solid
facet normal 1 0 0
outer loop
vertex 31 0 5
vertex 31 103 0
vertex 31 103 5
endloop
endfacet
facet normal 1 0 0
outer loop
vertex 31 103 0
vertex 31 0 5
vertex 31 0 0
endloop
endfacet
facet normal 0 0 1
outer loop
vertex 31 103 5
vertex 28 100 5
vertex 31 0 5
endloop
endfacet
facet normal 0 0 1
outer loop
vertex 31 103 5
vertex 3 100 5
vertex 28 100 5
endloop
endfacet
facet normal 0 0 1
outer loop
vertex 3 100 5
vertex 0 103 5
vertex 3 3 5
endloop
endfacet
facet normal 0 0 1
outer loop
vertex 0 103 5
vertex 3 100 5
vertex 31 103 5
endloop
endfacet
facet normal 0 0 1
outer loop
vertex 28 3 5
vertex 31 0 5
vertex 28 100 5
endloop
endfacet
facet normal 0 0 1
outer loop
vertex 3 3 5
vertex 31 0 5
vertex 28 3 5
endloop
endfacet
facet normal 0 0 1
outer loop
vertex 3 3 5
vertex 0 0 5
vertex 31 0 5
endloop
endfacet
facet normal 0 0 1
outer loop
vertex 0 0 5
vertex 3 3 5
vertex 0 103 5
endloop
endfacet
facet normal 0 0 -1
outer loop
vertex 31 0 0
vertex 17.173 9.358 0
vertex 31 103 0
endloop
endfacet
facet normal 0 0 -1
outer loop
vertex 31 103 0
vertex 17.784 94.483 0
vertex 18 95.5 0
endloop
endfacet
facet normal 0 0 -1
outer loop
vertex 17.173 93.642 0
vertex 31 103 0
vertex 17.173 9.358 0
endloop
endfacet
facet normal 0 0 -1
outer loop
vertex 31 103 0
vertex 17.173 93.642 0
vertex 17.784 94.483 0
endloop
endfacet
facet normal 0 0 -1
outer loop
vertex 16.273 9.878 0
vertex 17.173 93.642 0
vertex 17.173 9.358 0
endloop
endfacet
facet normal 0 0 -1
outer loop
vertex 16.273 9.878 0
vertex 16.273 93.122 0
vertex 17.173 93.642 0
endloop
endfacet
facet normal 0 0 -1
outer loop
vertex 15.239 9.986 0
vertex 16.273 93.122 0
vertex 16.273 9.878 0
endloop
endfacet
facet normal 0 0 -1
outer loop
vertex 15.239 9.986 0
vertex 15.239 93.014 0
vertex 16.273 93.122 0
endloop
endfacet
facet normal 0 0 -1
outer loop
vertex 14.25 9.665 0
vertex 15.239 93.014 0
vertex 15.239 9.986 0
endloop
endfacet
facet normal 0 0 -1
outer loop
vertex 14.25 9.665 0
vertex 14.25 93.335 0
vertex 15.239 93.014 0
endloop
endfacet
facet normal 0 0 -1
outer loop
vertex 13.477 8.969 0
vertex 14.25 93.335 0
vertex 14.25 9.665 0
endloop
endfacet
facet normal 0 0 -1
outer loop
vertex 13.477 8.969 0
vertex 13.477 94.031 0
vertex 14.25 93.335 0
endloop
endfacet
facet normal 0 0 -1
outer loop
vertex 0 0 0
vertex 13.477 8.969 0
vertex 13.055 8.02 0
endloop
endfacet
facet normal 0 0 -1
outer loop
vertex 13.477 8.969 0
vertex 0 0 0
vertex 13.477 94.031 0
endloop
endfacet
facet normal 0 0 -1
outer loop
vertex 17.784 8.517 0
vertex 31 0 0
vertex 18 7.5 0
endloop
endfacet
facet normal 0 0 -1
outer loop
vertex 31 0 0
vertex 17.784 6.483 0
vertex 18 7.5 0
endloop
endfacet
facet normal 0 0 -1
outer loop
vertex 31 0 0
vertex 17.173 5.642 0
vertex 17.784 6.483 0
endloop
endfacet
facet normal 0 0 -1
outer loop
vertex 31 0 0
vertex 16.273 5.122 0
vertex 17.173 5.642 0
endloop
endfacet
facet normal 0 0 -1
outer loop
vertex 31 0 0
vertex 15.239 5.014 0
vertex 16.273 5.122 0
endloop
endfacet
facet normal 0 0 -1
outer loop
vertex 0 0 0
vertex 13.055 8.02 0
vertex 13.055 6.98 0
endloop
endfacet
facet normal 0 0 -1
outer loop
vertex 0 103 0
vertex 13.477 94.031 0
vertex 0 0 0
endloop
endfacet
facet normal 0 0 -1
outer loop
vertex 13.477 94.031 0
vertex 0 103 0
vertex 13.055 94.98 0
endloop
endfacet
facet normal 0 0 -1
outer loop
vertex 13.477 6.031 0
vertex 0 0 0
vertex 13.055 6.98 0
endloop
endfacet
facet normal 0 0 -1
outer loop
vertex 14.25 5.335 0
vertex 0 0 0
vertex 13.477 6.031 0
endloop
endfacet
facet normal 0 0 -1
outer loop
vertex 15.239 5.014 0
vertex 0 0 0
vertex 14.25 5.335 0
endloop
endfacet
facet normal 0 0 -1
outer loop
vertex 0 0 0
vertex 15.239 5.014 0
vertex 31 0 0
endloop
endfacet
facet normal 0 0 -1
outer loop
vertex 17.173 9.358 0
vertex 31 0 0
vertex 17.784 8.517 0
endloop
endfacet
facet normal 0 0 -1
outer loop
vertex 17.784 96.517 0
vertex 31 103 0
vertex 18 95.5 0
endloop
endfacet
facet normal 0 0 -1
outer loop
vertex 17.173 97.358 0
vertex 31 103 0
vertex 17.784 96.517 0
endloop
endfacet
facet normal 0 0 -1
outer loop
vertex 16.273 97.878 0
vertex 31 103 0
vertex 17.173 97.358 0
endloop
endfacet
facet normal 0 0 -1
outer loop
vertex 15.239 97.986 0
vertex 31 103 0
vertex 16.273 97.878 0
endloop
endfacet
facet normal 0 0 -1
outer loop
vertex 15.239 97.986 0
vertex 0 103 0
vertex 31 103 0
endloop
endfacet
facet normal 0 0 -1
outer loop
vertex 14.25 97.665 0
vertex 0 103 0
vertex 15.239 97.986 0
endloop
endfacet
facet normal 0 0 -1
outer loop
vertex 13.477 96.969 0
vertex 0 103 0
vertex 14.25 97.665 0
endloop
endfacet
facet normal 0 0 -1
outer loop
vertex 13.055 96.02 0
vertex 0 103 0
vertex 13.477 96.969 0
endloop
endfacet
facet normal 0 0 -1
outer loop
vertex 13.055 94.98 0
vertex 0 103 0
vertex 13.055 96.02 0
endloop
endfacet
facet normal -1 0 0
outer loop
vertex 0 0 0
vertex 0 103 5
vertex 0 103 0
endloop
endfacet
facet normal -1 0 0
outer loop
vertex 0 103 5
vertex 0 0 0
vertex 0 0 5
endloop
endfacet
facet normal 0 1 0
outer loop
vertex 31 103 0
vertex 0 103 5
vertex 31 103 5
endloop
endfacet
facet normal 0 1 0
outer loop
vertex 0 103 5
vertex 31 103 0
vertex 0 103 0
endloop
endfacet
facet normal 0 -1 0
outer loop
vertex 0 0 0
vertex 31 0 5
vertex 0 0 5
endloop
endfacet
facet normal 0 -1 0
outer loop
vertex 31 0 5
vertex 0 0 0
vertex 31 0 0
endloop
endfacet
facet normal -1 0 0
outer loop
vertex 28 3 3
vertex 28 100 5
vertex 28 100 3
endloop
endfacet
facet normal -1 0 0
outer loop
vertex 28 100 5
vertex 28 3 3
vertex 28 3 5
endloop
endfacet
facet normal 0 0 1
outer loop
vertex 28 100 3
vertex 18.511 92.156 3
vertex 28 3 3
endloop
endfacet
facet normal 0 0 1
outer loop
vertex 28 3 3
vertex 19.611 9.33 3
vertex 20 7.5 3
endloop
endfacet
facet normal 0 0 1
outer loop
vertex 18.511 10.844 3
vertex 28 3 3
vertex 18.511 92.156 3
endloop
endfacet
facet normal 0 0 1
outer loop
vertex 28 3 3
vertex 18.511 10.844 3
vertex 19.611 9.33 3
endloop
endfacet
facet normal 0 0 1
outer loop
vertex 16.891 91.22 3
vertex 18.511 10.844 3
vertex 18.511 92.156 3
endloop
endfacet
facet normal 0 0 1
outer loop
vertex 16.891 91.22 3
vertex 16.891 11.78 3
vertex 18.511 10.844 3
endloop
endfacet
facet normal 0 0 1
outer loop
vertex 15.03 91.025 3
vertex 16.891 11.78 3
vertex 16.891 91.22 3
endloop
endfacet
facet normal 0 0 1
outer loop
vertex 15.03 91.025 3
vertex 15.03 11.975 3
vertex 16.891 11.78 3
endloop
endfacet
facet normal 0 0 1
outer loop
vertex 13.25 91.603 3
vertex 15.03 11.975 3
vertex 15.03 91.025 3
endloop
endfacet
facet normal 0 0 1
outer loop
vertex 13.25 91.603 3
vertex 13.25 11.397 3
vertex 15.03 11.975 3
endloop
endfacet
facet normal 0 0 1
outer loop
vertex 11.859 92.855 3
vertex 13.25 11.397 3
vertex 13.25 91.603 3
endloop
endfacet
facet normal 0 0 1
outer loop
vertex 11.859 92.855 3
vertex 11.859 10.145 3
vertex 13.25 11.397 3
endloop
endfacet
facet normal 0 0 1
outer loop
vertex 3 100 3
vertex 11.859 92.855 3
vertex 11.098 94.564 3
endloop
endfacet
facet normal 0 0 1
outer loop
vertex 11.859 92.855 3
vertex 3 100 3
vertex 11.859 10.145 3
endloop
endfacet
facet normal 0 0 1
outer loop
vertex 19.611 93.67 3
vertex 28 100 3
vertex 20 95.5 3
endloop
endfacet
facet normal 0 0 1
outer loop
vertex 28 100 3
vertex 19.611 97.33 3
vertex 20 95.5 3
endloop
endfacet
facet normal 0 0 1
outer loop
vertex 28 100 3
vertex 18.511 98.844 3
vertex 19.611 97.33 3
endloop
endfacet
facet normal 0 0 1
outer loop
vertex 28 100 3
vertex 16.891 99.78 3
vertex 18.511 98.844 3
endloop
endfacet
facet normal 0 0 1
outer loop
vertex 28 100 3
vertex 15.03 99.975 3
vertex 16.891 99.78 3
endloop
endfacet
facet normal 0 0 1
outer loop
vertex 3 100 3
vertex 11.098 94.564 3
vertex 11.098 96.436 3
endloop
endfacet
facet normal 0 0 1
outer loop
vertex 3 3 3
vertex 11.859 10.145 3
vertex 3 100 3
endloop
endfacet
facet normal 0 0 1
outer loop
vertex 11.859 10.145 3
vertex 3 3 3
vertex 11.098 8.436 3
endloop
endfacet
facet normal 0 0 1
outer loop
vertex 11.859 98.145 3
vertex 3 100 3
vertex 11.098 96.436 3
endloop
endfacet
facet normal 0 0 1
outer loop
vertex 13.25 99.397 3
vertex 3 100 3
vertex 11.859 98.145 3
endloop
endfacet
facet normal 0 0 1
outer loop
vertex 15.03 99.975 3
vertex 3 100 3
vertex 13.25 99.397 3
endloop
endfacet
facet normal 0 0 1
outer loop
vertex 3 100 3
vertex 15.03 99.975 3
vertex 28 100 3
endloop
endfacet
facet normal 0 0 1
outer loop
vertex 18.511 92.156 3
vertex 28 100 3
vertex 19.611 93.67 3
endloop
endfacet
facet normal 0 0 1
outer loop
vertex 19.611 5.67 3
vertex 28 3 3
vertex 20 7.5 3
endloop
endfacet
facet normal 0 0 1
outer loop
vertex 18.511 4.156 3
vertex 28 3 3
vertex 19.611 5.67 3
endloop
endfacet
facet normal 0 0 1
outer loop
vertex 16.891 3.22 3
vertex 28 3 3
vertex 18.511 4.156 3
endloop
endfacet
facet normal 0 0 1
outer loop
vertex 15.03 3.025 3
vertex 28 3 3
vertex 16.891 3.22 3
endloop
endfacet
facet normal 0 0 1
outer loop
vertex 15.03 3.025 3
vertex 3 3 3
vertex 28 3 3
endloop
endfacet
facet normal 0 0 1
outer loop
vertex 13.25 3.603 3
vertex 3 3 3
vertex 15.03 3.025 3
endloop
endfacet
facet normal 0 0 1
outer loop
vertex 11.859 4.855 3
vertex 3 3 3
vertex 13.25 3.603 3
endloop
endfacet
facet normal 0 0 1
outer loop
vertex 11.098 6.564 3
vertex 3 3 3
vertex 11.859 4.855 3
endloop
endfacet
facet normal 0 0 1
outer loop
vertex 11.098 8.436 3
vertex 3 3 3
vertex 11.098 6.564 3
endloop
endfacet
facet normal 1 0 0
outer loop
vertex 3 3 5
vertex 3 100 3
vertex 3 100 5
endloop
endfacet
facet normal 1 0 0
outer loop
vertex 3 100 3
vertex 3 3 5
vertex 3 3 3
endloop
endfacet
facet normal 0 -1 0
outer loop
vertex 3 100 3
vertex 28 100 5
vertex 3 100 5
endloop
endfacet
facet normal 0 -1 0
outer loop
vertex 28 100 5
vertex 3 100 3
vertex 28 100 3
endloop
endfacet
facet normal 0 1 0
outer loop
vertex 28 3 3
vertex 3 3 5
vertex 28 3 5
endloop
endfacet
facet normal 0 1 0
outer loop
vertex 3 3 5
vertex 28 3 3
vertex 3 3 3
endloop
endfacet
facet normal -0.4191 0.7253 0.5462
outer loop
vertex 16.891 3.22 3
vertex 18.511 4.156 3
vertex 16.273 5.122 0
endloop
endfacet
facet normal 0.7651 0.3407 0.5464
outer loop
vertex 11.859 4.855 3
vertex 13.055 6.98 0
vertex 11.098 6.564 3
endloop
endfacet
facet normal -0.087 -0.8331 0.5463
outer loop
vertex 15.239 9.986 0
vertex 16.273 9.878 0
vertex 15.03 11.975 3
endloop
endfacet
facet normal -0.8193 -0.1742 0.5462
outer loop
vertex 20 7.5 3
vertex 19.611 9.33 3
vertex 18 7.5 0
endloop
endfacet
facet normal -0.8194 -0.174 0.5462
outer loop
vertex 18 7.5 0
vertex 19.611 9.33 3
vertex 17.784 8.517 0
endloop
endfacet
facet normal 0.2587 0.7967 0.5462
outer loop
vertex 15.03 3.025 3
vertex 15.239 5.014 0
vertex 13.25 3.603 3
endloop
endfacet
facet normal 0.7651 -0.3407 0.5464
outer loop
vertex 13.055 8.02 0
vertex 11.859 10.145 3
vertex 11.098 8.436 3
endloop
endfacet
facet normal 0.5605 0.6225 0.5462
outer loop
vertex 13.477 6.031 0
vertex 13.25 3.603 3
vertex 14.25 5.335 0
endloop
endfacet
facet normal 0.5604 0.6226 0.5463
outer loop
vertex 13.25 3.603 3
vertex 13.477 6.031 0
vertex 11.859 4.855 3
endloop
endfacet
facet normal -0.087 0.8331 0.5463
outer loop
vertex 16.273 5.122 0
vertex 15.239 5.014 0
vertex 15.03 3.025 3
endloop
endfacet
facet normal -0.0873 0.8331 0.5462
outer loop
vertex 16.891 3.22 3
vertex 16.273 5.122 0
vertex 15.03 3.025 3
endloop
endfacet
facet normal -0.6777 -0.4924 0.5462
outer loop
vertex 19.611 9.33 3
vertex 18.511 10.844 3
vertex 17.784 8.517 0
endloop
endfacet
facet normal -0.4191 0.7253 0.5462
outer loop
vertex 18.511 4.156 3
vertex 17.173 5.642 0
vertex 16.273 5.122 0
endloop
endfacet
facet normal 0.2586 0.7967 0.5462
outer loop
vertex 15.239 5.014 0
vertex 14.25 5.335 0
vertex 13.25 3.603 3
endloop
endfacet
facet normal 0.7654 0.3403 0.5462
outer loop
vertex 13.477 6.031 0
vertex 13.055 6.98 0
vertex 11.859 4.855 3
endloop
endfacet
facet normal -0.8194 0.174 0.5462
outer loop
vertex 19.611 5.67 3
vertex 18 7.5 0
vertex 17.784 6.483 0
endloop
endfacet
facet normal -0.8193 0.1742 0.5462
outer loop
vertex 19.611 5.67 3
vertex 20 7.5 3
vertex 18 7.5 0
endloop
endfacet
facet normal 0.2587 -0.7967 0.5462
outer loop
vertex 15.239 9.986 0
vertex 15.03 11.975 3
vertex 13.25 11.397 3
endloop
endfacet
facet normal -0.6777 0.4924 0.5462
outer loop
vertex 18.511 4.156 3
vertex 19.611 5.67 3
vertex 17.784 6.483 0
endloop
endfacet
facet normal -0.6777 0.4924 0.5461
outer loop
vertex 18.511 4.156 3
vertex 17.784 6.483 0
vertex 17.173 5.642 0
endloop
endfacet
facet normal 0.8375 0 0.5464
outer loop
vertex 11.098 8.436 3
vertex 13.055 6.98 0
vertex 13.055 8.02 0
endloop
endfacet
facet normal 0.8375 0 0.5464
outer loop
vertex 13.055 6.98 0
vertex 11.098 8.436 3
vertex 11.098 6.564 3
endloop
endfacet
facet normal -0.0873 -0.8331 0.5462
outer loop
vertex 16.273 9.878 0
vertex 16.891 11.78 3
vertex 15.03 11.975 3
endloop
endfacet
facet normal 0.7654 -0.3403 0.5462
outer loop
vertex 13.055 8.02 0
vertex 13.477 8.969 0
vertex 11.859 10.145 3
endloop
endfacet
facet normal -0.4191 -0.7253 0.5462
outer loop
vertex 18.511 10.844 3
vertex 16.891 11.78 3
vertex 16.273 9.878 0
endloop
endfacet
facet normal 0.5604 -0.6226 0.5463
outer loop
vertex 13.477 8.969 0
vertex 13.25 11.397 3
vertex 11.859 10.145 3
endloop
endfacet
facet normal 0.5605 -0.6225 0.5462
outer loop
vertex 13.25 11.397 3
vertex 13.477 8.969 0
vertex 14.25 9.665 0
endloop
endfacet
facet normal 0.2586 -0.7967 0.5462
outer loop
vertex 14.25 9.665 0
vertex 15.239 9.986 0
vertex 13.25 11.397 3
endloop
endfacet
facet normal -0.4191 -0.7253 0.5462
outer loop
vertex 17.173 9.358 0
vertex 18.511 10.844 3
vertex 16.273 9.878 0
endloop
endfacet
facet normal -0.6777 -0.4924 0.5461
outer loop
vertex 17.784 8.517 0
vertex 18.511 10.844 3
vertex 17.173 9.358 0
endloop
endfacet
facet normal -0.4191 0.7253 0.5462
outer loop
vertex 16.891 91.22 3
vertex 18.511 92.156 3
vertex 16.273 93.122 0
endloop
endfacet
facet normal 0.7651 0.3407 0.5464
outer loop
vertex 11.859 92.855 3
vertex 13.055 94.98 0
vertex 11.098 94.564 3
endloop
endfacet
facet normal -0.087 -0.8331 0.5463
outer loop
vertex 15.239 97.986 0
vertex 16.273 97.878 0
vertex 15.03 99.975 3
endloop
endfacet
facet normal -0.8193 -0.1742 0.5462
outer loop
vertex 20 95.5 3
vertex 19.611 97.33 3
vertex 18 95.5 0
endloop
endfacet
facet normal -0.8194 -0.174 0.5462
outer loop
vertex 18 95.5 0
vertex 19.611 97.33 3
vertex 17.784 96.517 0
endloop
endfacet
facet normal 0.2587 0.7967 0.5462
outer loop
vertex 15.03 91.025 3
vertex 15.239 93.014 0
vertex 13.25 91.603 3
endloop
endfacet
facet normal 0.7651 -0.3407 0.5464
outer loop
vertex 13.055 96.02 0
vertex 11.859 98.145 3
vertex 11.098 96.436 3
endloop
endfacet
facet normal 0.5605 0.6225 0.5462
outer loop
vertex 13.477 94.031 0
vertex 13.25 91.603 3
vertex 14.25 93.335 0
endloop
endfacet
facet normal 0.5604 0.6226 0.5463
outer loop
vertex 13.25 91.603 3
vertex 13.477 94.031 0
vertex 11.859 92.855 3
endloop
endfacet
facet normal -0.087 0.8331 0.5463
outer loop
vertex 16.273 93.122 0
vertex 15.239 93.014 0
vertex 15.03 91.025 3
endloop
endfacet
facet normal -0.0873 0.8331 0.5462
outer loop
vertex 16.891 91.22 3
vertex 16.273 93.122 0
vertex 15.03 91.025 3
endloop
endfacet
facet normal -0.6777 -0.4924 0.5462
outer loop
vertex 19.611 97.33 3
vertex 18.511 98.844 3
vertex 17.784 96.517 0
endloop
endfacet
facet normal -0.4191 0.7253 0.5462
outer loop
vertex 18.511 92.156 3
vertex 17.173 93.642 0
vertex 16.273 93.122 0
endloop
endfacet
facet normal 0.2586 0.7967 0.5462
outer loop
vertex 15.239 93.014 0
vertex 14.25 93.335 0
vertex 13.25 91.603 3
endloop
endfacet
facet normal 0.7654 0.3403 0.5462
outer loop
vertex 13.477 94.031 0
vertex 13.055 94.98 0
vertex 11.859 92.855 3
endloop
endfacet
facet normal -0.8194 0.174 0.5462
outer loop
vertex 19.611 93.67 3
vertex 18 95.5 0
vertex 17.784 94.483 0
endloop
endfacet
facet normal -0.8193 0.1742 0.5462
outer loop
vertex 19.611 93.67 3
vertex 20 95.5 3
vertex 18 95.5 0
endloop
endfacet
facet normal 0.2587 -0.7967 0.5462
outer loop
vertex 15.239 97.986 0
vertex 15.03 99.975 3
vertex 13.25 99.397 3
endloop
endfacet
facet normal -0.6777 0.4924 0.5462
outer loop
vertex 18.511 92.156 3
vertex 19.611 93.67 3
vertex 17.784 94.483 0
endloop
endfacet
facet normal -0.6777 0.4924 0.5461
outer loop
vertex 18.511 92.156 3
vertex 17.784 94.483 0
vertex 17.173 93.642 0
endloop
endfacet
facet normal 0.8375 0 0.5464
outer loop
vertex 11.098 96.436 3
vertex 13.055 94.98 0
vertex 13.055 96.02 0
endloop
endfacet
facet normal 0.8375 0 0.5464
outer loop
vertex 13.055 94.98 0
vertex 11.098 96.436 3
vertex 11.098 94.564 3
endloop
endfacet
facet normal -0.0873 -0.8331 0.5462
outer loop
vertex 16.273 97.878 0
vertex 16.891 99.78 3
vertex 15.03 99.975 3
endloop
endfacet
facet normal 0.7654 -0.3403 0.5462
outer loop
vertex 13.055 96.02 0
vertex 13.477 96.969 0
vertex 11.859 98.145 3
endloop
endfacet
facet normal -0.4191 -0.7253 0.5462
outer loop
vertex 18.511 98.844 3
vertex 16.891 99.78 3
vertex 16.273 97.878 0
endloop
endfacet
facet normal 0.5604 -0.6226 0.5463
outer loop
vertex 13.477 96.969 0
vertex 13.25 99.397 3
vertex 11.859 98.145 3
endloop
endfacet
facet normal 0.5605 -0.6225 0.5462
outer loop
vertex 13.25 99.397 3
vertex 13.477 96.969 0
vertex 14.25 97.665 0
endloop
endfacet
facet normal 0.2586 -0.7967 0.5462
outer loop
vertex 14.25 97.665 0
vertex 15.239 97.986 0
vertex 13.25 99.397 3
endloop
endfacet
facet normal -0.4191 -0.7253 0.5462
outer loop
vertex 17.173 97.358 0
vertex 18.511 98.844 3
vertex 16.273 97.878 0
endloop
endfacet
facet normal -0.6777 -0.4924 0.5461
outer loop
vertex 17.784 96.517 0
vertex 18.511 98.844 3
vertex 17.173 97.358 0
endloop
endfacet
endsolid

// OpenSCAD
// file: ../../../assets/components/fastener_holes.scad
/*
    Intended to make space for a fastener.

    parameters:
    -head           a vector [head length, head radius]
    -bore           a vector [bore length, bore radius]
    -countersink    countersink length, requires head radius and bore radius
*/

module fastener_hole(
    head = [0, 5],
    bore = [0, 3],
    countersink = 5
) {
    if (head[0] && head[1])
    cylinder(h = head[0], r = head[1], center = false);
    translate([0,0,-countersink]) {
        if (countersink)
        cylinder(h = countersink, r1 = bore[1], r2 = head[1], center = false);

        translate([0,0,-bore[0]]) {
            if (bore[0] && bore[1])
            cylinder(h = bore[0], r = bore[1], center = false);
        }
    }
}

module fastener_block(
    size,
    head = [0, 0],
    bore = [0, 0],
    countersink = 0
) {

    fastener_hole(head = head, bore = bore, countersink = countersink);
    translate([size.x, 0])
    fastener_hole(head = head, bore = bore, countersink = countersink);
    translate([size.x, size.y])
    fastener_hole(head = head, bore = bore, countersink = countersink);
    translate([0, size.y])
    fastener_hole(head = head, bore = bore, countersink = countersink);

}

module fastener_radial(
    radius,
    amount,
    head = [0, 6],
    bore = [0, 3],
    countersink = 5
) {
    step = 360 / amount;
    for(i = [0:amount]){
        rotate(i * step, [0,0,1])
        translate([radius,0,0]) 
        fastener_hole(head=head, bore=bore, countersink=countersink);
    }
}

// showcase
fastener_hole(
    head = [3,5],
    bore = [7,2],
    countersink = 3
);

translate([100, 0, 0]) 
fastener_block(
    size = [20, 40],
    head = [3, 5],
    bore = [10, 2],
    countersink = 0
);

translate([-150, 0, 0]) 
fastener_radial(
    radius = 50,
    amount = 8,
    head = [0, 7],
    bore = [0, 3],
    countersink = 5
);
// file: ../../../assets/components/box.scad
/*
    A simple parametric box (without cover)

    parameters:
    -size           is a vector [x, y, z]
    -thickness_b    the thickness of the bottom face
    -thickness_w    The thickness of the wall faces
*/

module box (
    size,
    thickness_b = 2,
    thickness_w = 2
) {
    difference() {
        cube([size.x, size.y, size.z]);

        translate(v = [thickness_w, thickness_w, thickness_b]){
            cube([size.x - thickness_w * 2, size.y - thickness_w * 2, size.z]);
        }
    }
}


box([30, 20, 5]);
// main file
use <../../../assets/components/box.scad>
use <../../../assets/components/fastener_holes.scad>


height = 28;
width = 100;
frame_width = 3;
frame_height = 2;
thickness = 3;

screw_head_r = 4.5;
screw_shaft_r = 2.5;

fastener_head = [0, screw_head_r];
fastener_bore = [0, screw_shaft_r];

frame_x = height + frame_width;
frame_y = width + frame_width;

box_size = [frame_x, frame_y, frame_height + thickness];



difference() {
    #box(size = box_size, thickness_b=thickness, thickness_w=frame_width);
    union() {
        translate([frame_x / 2, thickness + screw_head_r, thickness]) 
        fastener_hole(head=fastener_head, bore=fastener_bore, countersink=thickness);
        translate([frame_x / 2, frame_y - (thickness + screw_head_r), thickness]) 
        fastener_hole(head=fastener_head, bore=fastener_bore, countersink=thickness);
    }
}
